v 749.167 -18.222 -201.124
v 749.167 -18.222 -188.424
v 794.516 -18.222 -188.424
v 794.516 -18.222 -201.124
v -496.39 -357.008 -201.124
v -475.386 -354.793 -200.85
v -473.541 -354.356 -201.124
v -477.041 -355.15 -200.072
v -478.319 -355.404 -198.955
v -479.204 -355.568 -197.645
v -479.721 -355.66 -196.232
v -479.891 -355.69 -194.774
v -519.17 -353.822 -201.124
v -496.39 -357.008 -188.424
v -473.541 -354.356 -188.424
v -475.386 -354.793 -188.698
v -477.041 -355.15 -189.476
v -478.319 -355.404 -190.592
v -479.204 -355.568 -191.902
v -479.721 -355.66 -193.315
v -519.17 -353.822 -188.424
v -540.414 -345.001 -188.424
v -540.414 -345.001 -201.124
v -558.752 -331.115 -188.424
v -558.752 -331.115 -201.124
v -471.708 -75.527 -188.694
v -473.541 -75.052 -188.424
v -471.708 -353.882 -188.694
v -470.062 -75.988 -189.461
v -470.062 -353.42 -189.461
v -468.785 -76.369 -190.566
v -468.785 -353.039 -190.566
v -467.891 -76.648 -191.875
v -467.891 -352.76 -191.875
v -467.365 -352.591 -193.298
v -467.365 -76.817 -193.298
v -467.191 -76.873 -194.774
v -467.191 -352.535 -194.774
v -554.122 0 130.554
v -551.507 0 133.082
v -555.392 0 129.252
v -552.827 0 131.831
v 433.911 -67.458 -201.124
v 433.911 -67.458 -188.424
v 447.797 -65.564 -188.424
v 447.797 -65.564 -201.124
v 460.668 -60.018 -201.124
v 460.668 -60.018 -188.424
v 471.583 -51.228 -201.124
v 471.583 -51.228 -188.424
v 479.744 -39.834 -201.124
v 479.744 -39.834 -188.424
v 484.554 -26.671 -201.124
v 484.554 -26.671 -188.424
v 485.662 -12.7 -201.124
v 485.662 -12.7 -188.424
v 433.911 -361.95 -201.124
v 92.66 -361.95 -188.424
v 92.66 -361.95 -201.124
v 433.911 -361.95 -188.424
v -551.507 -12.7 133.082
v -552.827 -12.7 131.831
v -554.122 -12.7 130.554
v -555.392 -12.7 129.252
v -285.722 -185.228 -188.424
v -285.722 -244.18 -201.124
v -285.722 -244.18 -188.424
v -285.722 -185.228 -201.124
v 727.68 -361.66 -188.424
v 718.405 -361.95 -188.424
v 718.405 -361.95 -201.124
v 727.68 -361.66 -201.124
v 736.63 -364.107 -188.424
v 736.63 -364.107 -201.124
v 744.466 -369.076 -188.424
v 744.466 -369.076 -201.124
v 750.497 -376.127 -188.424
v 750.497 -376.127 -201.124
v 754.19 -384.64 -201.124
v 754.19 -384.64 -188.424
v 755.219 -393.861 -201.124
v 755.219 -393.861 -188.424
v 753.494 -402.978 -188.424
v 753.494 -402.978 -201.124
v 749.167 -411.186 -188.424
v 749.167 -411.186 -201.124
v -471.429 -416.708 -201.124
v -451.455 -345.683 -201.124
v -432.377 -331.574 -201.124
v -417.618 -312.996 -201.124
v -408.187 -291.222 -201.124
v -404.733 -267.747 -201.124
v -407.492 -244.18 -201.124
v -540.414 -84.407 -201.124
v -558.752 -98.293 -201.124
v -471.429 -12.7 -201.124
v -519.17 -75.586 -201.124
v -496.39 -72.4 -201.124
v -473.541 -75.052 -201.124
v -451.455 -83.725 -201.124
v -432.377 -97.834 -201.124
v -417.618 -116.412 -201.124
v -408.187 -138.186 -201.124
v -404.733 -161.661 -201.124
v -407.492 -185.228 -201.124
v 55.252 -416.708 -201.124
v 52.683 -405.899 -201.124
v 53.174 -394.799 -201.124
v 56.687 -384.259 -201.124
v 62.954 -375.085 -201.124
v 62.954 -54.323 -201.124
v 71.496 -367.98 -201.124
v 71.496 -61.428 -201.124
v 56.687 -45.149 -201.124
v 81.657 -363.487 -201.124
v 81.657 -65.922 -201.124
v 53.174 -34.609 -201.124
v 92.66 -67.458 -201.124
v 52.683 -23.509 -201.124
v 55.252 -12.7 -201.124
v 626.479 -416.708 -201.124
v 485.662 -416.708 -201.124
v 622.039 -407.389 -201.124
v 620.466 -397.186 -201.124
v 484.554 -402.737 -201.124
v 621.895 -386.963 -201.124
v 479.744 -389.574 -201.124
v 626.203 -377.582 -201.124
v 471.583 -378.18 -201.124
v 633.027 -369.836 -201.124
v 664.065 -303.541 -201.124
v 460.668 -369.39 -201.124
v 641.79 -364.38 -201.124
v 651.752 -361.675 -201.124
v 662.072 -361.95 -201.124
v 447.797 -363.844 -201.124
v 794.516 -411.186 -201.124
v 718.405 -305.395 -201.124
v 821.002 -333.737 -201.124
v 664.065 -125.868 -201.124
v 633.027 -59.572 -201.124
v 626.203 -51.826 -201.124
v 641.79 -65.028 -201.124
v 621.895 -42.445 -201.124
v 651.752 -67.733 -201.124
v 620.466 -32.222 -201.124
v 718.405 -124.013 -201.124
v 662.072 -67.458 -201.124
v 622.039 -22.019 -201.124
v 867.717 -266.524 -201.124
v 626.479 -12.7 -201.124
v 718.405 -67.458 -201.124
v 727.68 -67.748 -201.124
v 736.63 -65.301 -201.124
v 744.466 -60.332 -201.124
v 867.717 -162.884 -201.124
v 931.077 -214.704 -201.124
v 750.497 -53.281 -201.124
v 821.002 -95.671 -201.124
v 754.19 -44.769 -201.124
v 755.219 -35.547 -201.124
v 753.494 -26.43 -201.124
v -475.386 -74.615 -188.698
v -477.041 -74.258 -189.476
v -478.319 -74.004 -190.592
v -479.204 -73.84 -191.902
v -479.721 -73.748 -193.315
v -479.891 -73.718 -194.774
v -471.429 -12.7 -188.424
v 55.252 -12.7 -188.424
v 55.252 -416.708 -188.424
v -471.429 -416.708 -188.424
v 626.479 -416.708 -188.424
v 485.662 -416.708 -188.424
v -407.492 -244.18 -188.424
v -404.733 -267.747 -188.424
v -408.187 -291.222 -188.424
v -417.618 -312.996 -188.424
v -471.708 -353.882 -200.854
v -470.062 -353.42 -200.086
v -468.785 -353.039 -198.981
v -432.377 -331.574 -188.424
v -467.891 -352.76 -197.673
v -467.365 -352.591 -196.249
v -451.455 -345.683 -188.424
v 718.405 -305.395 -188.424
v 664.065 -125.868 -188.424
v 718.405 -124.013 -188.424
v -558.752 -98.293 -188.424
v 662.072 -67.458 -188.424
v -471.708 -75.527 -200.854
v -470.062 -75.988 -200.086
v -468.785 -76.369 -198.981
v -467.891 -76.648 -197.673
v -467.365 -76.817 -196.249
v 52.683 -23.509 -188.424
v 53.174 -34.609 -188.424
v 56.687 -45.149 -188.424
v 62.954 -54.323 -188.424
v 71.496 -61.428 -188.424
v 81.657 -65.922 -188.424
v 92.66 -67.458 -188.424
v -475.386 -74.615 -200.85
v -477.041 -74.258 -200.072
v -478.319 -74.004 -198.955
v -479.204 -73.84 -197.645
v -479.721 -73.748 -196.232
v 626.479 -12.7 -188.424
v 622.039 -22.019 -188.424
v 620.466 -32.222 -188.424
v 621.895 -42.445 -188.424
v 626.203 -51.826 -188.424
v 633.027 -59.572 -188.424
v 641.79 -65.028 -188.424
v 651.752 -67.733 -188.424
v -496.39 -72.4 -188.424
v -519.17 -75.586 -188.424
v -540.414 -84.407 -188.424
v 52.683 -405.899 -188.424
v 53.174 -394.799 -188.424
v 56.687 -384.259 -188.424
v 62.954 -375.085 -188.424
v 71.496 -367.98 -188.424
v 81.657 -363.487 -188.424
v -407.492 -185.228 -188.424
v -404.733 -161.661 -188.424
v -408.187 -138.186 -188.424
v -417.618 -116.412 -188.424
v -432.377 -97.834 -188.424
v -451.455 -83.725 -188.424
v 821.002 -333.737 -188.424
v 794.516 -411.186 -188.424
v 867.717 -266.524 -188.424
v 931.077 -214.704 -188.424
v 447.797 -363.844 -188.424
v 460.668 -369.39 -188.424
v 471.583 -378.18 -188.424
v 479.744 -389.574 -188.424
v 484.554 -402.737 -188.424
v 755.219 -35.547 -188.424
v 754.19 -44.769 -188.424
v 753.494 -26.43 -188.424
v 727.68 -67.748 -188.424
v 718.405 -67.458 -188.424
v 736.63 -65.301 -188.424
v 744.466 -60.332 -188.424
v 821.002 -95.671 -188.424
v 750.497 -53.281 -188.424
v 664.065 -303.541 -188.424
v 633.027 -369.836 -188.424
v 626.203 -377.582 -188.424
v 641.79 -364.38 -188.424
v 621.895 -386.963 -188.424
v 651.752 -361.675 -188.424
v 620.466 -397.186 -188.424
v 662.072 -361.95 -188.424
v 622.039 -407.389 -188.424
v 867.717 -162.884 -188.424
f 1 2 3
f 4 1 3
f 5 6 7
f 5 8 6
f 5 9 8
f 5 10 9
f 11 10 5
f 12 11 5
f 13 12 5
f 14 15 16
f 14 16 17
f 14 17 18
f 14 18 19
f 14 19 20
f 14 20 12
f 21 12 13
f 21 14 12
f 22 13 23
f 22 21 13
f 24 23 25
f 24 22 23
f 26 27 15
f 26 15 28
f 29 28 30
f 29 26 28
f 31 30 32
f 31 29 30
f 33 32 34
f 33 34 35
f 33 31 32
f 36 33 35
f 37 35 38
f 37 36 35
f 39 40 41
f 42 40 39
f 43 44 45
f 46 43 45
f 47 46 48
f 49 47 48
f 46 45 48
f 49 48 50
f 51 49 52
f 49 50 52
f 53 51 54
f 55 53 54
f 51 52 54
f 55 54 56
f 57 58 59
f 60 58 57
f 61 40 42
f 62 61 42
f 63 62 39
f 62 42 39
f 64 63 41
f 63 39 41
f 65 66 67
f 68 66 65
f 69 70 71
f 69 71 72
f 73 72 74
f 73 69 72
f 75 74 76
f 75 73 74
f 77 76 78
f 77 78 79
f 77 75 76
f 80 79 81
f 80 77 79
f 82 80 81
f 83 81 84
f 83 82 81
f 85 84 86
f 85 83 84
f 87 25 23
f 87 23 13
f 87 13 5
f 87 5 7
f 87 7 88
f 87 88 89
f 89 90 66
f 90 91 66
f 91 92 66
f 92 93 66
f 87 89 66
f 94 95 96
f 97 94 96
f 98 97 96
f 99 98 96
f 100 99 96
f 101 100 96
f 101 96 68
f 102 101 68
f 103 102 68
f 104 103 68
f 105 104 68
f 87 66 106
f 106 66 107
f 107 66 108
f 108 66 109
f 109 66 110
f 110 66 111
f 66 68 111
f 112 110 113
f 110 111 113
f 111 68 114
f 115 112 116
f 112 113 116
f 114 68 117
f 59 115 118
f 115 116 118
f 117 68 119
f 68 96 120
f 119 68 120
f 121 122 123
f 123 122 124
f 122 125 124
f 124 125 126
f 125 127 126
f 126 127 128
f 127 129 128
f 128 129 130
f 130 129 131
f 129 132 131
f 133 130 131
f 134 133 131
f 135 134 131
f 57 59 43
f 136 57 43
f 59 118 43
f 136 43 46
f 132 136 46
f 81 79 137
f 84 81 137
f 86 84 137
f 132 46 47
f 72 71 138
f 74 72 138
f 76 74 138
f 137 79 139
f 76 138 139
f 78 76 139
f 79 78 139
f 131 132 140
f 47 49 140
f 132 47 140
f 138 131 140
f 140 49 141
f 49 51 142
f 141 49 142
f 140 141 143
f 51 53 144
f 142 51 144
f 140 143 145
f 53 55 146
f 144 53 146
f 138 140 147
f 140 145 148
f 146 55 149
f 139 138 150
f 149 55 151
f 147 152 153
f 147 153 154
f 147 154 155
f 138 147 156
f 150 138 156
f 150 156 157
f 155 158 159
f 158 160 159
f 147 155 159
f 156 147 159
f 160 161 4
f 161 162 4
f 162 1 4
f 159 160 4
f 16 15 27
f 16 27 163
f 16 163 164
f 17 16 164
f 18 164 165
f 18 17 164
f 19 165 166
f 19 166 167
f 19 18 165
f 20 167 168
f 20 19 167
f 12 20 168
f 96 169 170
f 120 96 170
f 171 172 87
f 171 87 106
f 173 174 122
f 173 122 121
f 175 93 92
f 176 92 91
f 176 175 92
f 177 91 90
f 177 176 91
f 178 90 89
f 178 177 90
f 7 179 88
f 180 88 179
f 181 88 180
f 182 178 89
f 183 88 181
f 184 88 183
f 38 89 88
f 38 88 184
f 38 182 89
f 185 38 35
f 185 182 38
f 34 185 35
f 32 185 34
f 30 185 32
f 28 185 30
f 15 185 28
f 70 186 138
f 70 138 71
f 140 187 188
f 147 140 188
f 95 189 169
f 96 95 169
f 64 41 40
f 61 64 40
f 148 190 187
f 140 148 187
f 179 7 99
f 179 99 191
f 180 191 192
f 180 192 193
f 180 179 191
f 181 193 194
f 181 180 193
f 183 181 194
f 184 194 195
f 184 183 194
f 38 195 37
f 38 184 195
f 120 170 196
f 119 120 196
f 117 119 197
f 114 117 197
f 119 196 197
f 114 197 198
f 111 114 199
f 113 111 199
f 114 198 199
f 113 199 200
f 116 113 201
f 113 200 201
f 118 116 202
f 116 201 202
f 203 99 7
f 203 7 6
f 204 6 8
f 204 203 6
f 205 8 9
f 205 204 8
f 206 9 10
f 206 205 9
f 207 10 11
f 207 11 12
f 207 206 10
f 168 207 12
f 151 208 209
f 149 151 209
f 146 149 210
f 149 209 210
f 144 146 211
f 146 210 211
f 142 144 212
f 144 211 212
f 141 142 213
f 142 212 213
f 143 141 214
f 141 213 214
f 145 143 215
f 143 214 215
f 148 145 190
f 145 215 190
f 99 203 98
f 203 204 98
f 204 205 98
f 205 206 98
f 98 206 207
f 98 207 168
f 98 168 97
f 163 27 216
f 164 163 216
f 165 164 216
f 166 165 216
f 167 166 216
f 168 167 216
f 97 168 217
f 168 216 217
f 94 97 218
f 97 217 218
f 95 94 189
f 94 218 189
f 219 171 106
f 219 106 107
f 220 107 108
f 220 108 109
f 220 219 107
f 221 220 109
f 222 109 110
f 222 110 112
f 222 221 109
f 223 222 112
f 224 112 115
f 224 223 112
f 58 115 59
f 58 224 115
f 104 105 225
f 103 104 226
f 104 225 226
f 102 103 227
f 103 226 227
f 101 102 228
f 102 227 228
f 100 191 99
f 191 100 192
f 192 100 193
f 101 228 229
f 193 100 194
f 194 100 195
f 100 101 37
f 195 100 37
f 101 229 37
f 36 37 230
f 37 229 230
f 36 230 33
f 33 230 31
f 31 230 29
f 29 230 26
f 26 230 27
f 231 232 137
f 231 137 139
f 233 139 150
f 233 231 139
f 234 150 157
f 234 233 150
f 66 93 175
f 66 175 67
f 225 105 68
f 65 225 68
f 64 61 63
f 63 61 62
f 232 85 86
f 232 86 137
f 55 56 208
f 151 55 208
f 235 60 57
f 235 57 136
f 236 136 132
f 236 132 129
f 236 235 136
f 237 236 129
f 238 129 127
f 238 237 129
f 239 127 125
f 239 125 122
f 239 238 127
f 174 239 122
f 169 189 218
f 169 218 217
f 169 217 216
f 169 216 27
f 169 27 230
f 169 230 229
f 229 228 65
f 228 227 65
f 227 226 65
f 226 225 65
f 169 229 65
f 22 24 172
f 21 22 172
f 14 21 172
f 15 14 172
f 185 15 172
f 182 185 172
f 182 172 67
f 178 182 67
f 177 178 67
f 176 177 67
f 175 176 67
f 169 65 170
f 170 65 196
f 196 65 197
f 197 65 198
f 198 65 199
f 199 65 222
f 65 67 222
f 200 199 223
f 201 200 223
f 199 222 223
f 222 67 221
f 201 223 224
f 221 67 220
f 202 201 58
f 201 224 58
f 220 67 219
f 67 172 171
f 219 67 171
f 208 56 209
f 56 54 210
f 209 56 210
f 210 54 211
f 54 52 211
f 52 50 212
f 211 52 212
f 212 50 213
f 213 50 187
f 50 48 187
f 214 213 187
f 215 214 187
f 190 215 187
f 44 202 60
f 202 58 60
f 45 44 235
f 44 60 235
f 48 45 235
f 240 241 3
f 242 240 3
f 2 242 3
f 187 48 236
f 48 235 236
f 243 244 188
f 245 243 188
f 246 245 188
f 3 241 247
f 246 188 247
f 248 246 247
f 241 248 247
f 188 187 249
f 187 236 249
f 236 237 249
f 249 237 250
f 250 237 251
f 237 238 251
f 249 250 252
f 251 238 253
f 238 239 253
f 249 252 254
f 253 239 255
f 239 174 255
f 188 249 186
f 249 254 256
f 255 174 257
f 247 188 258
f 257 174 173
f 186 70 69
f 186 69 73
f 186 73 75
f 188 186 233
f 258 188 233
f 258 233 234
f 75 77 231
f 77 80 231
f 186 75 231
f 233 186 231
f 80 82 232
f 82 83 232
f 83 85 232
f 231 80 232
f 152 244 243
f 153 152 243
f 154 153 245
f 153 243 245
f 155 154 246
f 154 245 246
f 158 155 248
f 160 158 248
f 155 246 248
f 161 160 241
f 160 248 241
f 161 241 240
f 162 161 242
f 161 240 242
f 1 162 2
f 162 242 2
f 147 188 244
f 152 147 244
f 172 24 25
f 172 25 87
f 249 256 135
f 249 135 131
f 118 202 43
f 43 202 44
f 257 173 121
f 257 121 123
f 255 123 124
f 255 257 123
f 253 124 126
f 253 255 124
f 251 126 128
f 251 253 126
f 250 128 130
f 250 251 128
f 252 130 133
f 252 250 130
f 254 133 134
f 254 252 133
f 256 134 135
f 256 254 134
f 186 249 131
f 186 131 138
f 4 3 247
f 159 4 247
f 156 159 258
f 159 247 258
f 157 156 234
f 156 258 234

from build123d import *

# Parameters (mm, degrees)
F1_DEPTH = 12.7
F3_DEPTH = 25.4
F4_ANGLE = -90
F6_DEPTH = 12.7
F7_R     = 6.34999
F9_DEPTH = 25.4


# Not quite as in the source:
# - a fillet or chamfer is up to 0.001 mm smaller than in the source, because OpenCascade refuses the exact size


with BuildPart() as f1:
    # F0 (on Front) → F1 (new body)
    with BuildSketch(Plane.XZ):
        with BuildLine():
            ThreePointArc((-551.5071092971, 133.0818972722), (-553.4774467821, 131.195514327), (-555.3919033624, 129.2524429377))
            Line((-555.3919033624, 129.2524429377), (-551.5071092971, 133.0818972722))
        make_face()
    extrude(amount=F1_DEPTH)


with BuildPart() as f1b:
    # F0 (on Front) → F1, piece 2 (new body)
    with BuildSketch(Plane.XZ):
        with BuildLine():
            Line((-453.7474366549, 229.4489622575), (-551.5071092971, 133.0818972722))
            ThreePointArc((-551.5071092971, 133.0818972722), (-421.2871550244, 130.2472203685), (-420.3209924027, 0))
            ThreePointArc((-420.3209924027, 0), (-437.2739000343, -120.3876548814), (-558.7522743609, -115.5303823993))
            Line((-558.7522743609, -115.5303823993), (-471.4288946656, -201.1237346153))
            Line((-471.4288946656, -201.1237346153), (55.251994791, -201.1237346153))
            ThreePointArc((55.251994791, -201.1237346153), (59.5020266904, -163.8701869369), (92.6602373357, -146.3652547012))
            Line((92.6602373357, -146.3652547012), (433.9113681994, -146.3652547012))
            ThreePointArc((433.9113681994, -146.3652547012), (471.5831439124, -162.596085617), (485.6623065385, -201.1237346153))
            Line((485.6623065385, -201.1237346153), (626.4786631969, -201.1237346153))
            ThreePointArc((626.4786631969, -201.1237346153), (626.2028327697, -161.9974569275), (662.0717042558, -146.3652547012))
            Line((662.0717042558, -146.3652547012), (664.0649618373, -87.9562156213))
            Line((664.0649618373, -87.9562156213), (718.4053118981, -89.8106257683))
            Line((718.4053118981, -89.8106257683), (718.4053118981, -146.3652547012))
            ThreePointArc((718.4053118981, -146.3652547012), (750.4967470004, -160.5430728915), (749.1668792481, -195.6016265885))
            Line((749.1668792481, -195.6016265885), (794.5158585675, -195.6016265885))
            ThreePointArc((794.5158585675, -195.6016265885), (855.3282500186, -65.2281359399), (970.4922497392, 20.9846658139))
            Line((970.4922497392, 20.9846658139), (1027.914232903, 45.041990274))
            Line((1027.914232903, 45.041990274), (970.3385240831, 64.0667292165))
            ThreePointArc((970.3385240831, 64.0667292165), (860.0446545539, 126.9892643459), (785.0380322682, 229.4489622575))
            Line((785.0380322682, 229.4489622575), (736.1340486713, 229.4489622575))
            ThreePointArc((736.1340486713, 229.4489622575), (741.0762182682, 198.5184113591), (715.5427964992, 180.3754129308))
            Line((715.5427964992, 180.3754129308), (715.5427964992, 124.8339117276))
            Line((715.5427964992, 124.8339117276), (664.0649618373, 124.8339117276))
            Line((664.0649618373, 124.8339117276), (664.0649618373, 180.3754129308))
            ThreePointArc((664.0649618373, 180.3754129308), (638.4145031933, 198.2409293595), (640.1981479333, 229.4489622575))
            Line((640.1981479333, 229.4489622575), (469.6364638671, 229.4489622575))
            ThreePointArc((469.6364638671, 229.4489622575), (456.2733947157, 194.8460388869), (422.1188209756, 180.3754129308))
            Line((422.1188209756, 180.3754129308), (92.6602373357, 180.3754129308))
            ThreePointArc((92.6602373357, 180.3754129308), (61.501921171, 195.5559509867), (54.2525633451, 229.4489622575))
            Line((54.2525633451, 229.4489622575), (-453.7474366549, 229.4489622575))
        make_face()
    extrude(amount=F1_DEPTH)

    # F2 (on face) → F3 (cut)
    with BuildSketch(Plane.XZ.offset(12.7)):
        with BuildLine():
            Line((-285.7219224498, 30.356762849), (-400.8898424865, 30.356762849))
            ThreePointArc((-400.8898424865, 30.356762849), (-409.1284035376, 14.232955234), (-420.3209924027, 0))
            ThreePointArc((-420.3209924027, 0), (-412.6608440211, -13.7391565158), (-407.4924357678, -28.5961363948))
            Line((-407.4924357678, -28.5961363948), (-285.7219224498, -28.5961363948))
            Line((-285.7219224498, -28.5961363948), (-285.7219224498, 30.356762849))
        make_face()
    extrude(amount=-F3_DEPTH, mode=Mode.SUBTRACT)


with BuildPart() as f1b_1:
    # F4: moved
    add(f1b.part.rotate(Axis((-208.0884499373, -12.7, -201.1237346153), (-1, 0, 0)), F4_ANGLE))

    # F5 (on face) → F6 (join)
    with BuildSketch(Plane.XY.offset(-188.4237346153)):
        with BuildLine():
            ThreePointArc((-467.190702687, -76.8733791477), (-473.483667963, -75.0662676156), (-479.890702687, -73.7183172825))
            Line((-479.890702687, -73.7183172825), (-479.890702687, -222.6516499079))
            Line((-479.890702687, -222.6516499079), (-467.190702687, -222.6516499079))
            Line((-467.190702687, -222.6516499079), (-467.190702687, -76.8733791477))
        make_face()
    extrude(amount=-F6_DEPTH)

    # F7 (radius 6.35 in the source; OpenCascade refuses exactly that, so slightly less here)
    f7_edges = [f1b_1.edges().sort_by_distance(p)[0] for p in [
        (-467.190703, -149.762515, -201.123735),
        (-467.190703, -149.762515, -188.423735),
        (-479.890703, -148.184984, -188.423735),
        (-479.890703, -148.184984, -201.123735),
    ]]
    fillet(f7_edges, radius=F7_R)

    # F8 (on face) → F9 (cut)
    with BuildSketch(Plane.XY.offset(-188.4237346153)):
        with BuildLine():
            Line((931.0774667122, -214.7040478424), (-285.7219224498, -214.7040478424))
            Line((-285.7219224498, -214.7040478424), (-285.7219224498, -244.1804974643))
            Line((-285.7219224498, -244.1804974643), (-400.8898424865, -244.1804974643))
            ThreePointArc((-400.8898424865, -244.1804974643), (-435.1874662946, -355.6740755463), (-551.5071092971, -346.9056318875))
            Line((-551.5071092971, -346.9056318875), (-453.7474366549, -443.2726968728))
            Line((-453.7474366549, -443.2726968728), (54.2525633451, -443.2726968728))
            ThreePointArc((54.2525633451, -443.2726968728), (61.501921171, -409.379685602), (92.6602373357, -394.1991475461))
            Line((92.6602373357, -394.1991475461), (422.1188209756, -394.1991475461))
            ThreePointArc((422.1188209756, -394.1991475461), (456.2733947157, -408.6697735022), (469.6364638671, -443.2726968728))
            Line((469.6364638671, -443.2726968728), (640.1981479333, -443.2726968728))
            ThreePointArc((640.1981479333, -443.2726968728), (638.4145031933, -412.0646639748), (664.0649618373, -394.1991475461))
            Line((664.0649618373, -394.1991475461), (664.0649618373, -338.6576463429))
            Line((664.0649618373, -338.6576463429), (715.5427964992, -338.6576463429))
            Line((715.5427964992, -338.6576463429), (715.5427964992, -394.1991475461))
            ThreePointArc((715.5427964992, -394.1991475461), (741.0762182682, -412.3421459744), (736.1340486713, -443.2726968728))
            Line((736.1340486713, -443.2726968728), (785.0380322682, -443.2726968728))
            ThreePointArc((785.0380322682, -443.2726968728), (860.0446545539, -340.8129989612), (970.3385240831, -277.8904638318))
            Line((970.3385240831, -277.8904638318), (1027.914232903, -258.8657248893))
            Line((1027.914232903, -258.8657248893), (970.4922497392, -234.8084004292))
            ThreePointArc((970.4922497392, -234.8084004292), (950.408070054, -225.4949210906), (931.0774667122, -214.7040478424))
        make_face()
    extrude(amount=-F9_DEPTH, mode=Mode.SUBTRACT)

    # F10: F1b across face


with BuildPart() as f1b_2:
    add(f1b_1.part)
    add(f1b_1.part.mirror(Plane(origin=(322.6777721312, -214.7040478424, -194.7737346153), x_dir=(1, 0, 0), z_dir=(0, -1, 0))))


solid = Compound([f1.part, f1b_2.part])
